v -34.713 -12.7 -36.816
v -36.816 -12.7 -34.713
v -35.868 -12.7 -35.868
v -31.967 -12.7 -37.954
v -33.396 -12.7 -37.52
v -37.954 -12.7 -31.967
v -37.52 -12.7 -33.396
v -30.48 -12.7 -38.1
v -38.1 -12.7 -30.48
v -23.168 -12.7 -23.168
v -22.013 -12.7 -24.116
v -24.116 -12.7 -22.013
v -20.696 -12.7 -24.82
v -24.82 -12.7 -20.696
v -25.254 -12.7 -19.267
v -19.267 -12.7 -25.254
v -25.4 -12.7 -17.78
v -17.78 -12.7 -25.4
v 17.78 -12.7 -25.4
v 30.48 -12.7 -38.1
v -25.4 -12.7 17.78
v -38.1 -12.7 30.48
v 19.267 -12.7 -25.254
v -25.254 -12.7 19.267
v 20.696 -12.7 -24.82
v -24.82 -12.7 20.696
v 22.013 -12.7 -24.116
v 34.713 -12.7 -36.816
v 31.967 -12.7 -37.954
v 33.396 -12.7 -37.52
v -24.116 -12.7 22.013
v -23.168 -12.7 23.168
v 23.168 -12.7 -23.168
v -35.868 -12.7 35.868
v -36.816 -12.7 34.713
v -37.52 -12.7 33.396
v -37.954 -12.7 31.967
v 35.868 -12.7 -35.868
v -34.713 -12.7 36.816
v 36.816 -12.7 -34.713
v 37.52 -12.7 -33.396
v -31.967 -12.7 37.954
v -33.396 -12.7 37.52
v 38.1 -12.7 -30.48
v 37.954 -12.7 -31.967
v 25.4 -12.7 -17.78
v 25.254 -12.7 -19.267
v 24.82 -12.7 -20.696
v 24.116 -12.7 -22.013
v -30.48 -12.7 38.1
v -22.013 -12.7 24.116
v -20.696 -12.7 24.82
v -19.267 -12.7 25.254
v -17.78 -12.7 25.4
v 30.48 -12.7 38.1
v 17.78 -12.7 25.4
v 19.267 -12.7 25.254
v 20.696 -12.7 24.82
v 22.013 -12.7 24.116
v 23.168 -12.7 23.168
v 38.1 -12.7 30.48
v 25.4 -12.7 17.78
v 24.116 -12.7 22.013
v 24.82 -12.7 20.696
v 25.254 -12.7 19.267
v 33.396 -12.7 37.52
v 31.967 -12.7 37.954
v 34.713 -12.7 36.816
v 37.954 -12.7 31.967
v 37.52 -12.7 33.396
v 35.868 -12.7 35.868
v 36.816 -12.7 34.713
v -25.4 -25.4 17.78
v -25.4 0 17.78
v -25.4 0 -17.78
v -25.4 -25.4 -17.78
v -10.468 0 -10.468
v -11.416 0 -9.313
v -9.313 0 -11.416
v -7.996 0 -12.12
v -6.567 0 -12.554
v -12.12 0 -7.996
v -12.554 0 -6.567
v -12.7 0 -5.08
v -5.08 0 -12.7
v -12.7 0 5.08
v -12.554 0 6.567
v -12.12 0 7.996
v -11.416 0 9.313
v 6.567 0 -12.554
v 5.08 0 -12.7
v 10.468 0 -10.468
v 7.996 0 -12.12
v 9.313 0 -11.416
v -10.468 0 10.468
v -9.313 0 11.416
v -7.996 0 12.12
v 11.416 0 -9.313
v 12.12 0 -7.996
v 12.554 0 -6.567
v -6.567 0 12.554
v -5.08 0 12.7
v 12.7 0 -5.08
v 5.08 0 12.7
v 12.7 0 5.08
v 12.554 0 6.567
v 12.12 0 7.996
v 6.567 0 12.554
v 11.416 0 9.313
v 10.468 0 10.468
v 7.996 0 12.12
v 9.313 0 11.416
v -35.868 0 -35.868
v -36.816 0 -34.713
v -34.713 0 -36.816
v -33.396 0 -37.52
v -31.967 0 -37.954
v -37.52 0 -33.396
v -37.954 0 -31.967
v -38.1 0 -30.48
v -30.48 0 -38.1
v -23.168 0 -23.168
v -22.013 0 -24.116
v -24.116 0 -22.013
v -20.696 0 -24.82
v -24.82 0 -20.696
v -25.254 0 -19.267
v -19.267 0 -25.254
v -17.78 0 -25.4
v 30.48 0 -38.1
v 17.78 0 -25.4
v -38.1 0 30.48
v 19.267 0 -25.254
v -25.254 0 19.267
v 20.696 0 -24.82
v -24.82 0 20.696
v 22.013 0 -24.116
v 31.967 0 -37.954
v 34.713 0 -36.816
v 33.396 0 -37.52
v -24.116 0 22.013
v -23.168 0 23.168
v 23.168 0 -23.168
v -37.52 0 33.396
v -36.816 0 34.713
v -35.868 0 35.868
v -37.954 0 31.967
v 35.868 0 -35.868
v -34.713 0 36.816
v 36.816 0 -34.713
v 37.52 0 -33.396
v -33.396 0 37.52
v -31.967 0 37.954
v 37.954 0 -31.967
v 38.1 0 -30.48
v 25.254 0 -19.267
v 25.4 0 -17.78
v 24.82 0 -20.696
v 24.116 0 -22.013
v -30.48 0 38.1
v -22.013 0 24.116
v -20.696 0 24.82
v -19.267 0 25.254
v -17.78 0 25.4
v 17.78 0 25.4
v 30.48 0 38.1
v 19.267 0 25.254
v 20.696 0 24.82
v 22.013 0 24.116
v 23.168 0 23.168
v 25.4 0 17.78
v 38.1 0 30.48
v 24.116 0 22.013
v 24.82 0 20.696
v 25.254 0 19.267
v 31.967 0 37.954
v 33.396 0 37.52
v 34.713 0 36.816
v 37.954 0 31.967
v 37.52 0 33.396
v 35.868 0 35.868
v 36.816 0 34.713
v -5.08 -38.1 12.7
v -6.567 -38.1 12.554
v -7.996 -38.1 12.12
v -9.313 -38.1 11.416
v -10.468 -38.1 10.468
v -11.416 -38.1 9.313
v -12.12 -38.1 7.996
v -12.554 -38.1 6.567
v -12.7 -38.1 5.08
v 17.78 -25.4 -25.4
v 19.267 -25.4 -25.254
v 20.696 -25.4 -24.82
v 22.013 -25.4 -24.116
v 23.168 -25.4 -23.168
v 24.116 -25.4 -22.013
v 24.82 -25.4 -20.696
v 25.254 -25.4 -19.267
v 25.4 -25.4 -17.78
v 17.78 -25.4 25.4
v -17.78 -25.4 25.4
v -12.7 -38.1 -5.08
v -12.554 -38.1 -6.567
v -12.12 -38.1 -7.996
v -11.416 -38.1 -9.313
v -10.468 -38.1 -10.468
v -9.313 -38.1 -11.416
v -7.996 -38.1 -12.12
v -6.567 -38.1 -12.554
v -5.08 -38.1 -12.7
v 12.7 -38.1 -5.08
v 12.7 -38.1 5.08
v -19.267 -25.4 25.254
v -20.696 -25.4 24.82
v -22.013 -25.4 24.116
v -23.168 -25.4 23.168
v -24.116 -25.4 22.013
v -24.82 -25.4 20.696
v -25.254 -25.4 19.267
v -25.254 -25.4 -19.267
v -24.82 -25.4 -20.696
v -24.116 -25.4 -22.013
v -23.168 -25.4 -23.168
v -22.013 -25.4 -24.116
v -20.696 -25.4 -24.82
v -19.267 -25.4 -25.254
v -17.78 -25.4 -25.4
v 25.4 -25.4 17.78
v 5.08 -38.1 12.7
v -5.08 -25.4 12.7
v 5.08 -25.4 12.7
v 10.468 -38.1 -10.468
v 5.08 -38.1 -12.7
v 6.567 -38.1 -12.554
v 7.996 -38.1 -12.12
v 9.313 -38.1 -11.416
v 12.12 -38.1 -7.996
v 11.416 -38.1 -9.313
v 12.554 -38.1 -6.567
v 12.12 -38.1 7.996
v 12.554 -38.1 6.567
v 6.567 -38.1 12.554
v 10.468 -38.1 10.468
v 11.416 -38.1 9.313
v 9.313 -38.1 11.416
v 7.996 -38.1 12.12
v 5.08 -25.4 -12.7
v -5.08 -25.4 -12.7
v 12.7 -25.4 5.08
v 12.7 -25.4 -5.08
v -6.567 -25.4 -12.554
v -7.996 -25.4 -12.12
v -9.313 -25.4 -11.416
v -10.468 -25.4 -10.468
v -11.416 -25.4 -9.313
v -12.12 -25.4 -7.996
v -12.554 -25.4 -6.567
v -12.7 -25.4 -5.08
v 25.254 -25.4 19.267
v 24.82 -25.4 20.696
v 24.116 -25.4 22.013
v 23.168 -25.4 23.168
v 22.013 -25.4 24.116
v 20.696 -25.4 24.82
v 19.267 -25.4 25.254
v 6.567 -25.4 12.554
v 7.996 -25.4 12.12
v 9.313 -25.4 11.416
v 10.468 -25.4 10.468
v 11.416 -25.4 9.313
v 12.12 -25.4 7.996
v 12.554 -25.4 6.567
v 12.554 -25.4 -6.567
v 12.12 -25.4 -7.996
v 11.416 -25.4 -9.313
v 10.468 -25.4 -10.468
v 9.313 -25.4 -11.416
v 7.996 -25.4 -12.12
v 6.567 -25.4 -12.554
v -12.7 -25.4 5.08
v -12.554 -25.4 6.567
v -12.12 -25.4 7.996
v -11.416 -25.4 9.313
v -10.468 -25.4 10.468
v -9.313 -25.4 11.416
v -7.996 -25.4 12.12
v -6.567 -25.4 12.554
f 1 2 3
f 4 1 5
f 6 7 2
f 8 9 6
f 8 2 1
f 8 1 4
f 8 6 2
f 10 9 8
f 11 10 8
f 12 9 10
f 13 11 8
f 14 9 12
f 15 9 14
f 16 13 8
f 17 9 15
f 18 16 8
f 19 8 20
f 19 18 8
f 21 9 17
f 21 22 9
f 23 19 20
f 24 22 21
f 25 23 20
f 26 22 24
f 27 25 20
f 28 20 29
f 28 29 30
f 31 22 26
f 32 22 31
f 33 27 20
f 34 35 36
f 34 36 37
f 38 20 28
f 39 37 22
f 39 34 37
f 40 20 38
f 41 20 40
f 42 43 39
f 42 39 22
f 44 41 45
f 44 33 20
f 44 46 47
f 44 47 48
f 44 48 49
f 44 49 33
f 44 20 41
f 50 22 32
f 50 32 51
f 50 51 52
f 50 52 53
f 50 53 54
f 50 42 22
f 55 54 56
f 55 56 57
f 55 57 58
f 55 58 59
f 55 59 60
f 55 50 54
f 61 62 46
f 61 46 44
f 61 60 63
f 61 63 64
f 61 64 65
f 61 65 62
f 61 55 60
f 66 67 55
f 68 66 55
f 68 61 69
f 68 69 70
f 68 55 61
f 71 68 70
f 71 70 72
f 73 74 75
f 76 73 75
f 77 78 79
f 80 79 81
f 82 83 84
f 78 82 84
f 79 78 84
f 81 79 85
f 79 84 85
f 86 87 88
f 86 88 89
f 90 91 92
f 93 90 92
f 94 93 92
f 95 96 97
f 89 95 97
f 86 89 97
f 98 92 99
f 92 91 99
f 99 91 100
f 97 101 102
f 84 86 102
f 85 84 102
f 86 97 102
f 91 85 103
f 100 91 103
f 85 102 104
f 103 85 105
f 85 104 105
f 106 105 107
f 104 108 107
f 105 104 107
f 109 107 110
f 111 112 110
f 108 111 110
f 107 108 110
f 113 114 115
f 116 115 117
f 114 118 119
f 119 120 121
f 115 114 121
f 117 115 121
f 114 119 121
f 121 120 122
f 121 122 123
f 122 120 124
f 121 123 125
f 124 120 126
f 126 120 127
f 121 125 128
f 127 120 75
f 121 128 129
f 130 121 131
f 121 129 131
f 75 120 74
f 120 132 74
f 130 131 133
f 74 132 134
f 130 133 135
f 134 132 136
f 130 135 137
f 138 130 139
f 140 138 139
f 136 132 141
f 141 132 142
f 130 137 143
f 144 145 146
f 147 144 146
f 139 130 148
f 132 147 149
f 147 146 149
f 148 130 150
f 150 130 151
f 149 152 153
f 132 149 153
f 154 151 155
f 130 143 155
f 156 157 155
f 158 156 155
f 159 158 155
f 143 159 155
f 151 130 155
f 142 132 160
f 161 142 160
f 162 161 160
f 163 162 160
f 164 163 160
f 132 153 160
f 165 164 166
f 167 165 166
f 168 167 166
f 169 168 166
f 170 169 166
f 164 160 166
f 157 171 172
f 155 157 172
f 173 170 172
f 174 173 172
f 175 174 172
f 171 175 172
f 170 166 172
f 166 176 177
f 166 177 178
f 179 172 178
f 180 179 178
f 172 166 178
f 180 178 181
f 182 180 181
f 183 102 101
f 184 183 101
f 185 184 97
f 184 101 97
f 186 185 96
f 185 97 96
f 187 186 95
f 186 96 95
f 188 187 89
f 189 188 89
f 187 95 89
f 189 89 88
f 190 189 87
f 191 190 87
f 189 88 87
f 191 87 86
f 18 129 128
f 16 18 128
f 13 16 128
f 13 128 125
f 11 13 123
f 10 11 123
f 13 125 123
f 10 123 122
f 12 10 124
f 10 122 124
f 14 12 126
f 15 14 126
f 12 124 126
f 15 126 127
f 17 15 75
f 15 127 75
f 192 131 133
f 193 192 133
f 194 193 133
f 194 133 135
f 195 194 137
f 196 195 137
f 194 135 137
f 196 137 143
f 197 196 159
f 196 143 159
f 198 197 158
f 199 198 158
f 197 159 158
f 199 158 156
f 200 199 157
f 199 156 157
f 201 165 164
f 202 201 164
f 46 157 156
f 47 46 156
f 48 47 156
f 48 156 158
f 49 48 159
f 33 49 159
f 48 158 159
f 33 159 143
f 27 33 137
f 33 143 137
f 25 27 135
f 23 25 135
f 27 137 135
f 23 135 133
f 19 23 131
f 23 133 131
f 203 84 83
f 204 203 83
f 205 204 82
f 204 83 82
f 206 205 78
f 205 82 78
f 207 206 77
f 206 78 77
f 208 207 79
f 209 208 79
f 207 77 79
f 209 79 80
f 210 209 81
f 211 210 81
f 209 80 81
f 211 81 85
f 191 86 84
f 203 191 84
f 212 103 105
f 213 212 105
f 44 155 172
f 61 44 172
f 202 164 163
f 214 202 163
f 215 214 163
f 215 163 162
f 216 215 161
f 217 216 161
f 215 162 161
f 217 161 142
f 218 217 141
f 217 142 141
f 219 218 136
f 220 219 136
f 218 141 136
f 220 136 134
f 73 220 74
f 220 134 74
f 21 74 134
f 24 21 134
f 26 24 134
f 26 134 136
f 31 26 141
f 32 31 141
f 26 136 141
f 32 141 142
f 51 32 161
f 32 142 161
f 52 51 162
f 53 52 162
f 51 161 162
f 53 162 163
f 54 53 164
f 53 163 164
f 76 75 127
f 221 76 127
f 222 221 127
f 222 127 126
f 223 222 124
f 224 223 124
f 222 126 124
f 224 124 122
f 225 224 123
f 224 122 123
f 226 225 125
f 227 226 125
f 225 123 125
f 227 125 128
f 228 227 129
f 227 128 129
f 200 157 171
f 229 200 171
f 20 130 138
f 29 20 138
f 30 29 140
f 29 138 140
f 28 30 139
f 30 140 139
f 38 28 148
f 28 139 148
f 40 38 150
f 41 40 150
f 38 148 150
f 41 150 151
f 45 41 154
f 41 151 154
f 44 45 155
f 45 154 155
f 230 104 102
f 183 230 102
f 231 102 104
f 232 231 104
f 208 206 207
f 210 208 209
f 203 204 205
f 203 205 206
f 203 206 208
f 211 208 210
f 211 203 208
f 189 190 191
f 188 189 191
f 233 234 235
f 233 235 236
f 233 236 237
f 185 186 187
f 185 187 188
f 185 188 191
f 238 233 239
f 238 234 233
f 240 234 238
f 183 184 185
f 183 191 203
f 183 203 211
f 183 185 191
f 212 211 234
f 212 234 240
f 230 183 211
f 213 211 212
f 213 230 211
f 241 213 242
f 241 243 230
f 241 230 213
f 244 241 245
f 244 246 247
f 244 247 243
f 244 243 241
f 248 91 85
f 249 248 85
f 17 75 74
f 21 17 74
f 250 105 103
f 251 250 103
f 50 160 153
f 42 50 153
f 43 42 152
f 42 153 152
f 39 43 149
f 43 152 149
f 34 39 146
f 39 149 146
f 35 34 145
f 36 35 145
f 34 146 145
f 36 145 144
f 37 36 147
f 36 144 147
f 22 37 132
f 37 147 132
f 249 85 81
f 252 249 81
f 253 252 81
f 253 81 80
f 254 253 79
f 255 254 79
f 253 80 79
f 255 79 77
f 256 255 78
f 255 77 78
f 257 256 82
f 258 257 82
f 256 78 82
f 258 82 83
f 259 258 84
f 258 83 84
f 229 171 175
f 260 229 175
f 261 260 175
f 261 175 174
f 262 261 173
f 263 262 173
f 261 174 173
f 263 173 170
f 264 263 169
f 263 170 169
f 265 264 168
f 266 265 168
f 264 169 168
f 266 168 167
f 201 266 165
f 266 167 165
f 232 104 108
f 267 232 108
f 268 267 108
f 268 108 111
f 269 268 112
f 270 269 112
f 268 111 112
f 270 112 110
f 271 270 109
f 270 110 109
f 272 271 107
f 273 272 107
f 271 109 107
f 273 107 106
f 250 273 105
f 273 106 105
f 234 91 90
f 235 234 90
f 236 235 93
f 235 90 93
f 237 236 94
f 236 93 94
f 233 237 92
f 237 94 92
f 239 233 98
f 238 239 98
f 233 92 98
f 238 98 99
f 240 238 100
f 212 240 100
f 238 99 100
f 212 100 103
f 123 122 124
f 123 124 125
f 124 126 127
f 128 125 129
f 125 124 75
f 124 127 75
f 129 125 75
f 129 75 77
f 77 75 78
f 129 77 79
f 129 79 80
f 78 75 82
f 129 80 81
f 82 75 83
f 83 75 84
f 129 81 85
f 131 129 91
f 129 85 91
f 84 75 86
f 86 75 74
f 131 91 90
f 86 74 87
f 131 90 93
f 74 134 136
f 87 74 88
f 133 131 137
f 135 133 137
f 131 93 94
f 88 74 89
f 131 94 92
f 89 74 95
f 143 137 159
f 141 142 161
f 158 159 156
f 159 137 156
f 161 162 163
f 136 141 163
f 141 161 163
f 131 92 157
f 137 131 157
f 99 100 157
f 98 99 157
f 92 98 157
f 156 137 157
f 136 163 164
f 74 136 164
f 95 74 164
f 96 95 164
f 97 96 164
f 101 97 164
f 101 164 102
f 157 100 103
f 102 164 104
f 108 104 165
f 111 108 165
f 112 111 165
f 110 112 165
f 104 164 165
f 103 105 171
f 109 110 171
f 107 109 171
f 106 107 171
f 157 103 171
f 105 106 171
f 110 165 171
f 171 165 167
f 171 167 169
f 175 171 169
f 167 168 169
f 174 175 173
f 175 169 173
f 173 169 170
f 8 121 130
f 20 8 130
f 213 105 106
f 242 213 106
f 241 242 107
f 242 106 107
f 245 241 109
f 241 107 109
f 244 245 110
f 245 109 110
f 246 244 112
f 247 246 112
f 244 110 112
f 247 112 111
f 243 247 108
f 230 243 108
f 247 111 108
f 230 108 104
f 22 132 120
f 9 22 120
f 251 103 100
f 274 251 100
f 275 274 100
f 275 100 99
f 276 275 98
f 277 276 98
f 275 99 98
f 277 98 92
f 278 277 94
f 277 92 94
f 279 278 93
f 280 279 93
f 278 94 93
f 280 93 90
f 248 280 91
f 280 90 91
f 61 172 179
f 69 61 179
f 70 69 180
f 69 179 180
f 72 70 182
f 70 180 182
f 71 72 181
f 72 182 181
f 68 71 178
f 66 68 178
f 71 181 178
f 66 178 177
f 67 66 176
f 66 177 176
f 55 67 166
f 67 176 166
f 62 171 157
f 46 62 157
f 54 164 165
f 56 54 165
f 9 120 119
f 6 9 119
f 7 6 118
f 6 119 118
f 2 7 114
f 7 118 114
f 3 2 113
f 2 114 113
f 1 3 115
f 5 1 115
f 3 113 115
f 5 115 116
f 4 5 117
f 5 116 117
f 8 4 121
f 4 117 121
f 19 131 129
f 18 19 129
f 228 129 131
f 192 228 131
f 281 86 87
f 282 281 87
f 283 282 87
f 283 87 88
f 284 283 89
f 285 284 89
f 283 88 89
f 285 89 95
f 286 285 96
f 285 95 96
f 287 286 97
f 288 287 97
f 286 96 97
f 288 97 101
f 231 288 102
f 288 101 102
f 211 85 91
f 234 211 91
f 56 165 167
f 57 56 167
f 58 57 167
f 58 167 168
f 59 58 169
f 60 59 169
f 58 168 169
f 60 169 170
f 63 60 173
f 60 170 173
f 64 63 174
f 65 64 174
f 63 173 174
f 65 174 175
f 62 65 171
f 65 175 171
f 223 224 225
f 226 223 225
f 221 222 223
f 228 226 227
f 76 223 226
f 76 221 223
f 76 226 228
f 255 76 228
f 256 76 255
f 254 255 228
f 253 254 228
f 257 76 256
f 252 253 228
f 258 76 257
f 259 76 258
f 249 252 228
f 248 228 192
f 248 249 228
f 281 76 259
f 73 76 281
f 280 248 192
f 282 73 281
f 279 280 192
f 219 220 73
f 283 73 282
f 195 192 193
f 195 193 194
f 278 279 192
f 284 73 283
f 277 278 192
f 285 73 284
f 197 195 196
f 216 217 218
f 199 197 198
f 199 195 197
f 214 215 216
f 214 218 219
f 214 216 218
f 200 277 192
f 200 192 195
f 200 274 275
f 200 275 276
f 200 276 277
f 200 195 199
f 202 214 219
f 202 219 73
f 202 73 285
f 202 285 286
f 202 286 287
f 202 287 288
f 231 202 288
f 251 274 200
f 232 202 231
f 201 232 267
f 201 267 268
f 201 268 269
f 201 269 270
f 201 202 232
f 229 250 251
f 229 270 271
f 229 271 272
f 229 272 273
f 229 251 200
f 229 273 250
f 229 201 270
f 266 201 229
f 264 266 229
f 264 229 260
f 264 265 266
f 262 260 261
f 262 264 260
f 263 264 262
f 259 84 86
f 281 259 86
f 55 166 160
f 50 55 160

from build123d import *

# Parameters (mm, degrees)
F1_DEPTH = 12.7
F2_DEPTH = 25.4
F3_DEPTH = 38.1


with BuildPart() as f1:
    # F0 (on Front) → F1 (new body)
    with BuildSketch(Plane.XZ):
        with BuildLine():
            Line((-30.48, -38.1), (30.48, -38.1))
            ThreePointArc((30.48, -38.1), (35.868154, -35.868154), (38.1, -30.48))
            Line((38.1, -30.48), (38.1, 30.48))
            ThreePointArc((38.1, 30.48), (35.868154, 35.868154), (30.48, 38.1))
            Line((30.48, 38.1), (-30.48, 38.1))
            ThreePointArc((-30.48, 38.1), (-35.868154, 35.868154), (-38.1, 30.48))
            Line((-38.1, 30.48), (-38.1, -30.48))
            ThreePointArc((-38.1, -30.48), (-35.868154, -35.868154), (-30.48, -38.1))
        make_face()
        with BuildLine():
            ThreePointArc((25.4, -17.78), (23.168154, -23.168154), (17.78, -25.4))
            Line((17.78, -25.4), (-17.78, -25.4))
            ThreePointArc((-17.78, -25.4), (-23.168154, -23.168154), (-25.4, -17.78))
            Line((-25.4, -17.78), (-25.4, 17.78))
            ThreePointArc((-25.4, 17.78), (-23.168154, 23.168154), (-17.78, 25.4))
            Line((-17.78, 25.4), (17.78, 25.4))
            ThreePointArc((17.78, 25.4), (23.168154, 23.168154), (25.4, 17.78))
            Line((25.4, 17.78), (25.4, -17.78))
        make_face(mode=Mode.SUBTRACT)
    extrude(amount=F1_DEPTH)


with BuildPart() as f2:
    # F0 (on Front) → F2 (new body)
    with BuildSketch(Plane.XZ):
        with BuildLine():
            Line((-17.78, -25.4), (17.78, -25.4))
            ThreePointArc((17.78, -25.4), (23.168154, -23.168154), (25.4, -17.78))
            Line((25.4, -17.78), (25.4, 17.78))
            ThreePointArc((25.4, 17.78), (23.168154, 23.168154), (17.78, 25.4))
            Line((17.78, 25.4), (-17.78, 25.4))
            ThreePointArc((-17.78, 25.4), (-23.168154, 23.168154), (-25.4, 17.78))
            Line((-25.4, 17.78), (-25.4, -17.78))
            ThreePointArc((-25.4, -17.78), (-23.168154, -23.168154), (-17.78, -25.4))
        make_face()
        with BuildLine():
            ThreePointArc((12.7, -5.08), (10.468154, -10.468154), (5.08, -12.7))
            Line((5.08, -12.7), (-5.08, -12.7))
            ThreePointArc((-5.08, -12.7), (-10.468154, -10.468154), (-12.7, -5.08))
            Line((-12.7, -5.08), (-12.7, 5.08))
            ThreePointArc((-12.7, 5.08), (-10.468154, 10.468154), (-5.08, 12.7))
            Line((-5.08, 12.7), (5.08, 12.7))
            ThreePointArc((5.08, 12.7), (10.468154, 10.468154), (12.7, 5.08))
            Line((12.7, 5.08), (12.7, -5.08))
        make_face(mode=Mode.SUBTRACT)
    extrude(amount=F2_DEPTH)


with BuildPart() as f3:
    # F0 (on Front) → F3 (new body)
    with BuildSketch(Plane.XZ):
        with BuildLine():
            Line((-5.08, -12.7), (5.08, -12.7))
            ThreePointArc((5.08, -12.7), (10.468154, -10.468154), (12.7, -5.08))
            Line((12.7, -5.08), (12.7, 5.08))
            ThreePointArc((12.7, 5.08), (10.468154, 10.468154), (5.08, 12.7))
            Line((5.08, 12.7), (-5.08, 12.7))
            ThreePointArc((-5.08, 12.7), (-10.468154, 10.468154), (-12.7, 5.08))
            Line((-12.7, 5.08), (-12.7, -5.08))
            ThreePointArc((-12.7, -5.08), (-10.468154, -10.468154), (-5.08, -12.7))
        make_face()
    extrude(amount=F3_DEPTH)


solid = Compound([f1.part, f2.part, f3.part])
